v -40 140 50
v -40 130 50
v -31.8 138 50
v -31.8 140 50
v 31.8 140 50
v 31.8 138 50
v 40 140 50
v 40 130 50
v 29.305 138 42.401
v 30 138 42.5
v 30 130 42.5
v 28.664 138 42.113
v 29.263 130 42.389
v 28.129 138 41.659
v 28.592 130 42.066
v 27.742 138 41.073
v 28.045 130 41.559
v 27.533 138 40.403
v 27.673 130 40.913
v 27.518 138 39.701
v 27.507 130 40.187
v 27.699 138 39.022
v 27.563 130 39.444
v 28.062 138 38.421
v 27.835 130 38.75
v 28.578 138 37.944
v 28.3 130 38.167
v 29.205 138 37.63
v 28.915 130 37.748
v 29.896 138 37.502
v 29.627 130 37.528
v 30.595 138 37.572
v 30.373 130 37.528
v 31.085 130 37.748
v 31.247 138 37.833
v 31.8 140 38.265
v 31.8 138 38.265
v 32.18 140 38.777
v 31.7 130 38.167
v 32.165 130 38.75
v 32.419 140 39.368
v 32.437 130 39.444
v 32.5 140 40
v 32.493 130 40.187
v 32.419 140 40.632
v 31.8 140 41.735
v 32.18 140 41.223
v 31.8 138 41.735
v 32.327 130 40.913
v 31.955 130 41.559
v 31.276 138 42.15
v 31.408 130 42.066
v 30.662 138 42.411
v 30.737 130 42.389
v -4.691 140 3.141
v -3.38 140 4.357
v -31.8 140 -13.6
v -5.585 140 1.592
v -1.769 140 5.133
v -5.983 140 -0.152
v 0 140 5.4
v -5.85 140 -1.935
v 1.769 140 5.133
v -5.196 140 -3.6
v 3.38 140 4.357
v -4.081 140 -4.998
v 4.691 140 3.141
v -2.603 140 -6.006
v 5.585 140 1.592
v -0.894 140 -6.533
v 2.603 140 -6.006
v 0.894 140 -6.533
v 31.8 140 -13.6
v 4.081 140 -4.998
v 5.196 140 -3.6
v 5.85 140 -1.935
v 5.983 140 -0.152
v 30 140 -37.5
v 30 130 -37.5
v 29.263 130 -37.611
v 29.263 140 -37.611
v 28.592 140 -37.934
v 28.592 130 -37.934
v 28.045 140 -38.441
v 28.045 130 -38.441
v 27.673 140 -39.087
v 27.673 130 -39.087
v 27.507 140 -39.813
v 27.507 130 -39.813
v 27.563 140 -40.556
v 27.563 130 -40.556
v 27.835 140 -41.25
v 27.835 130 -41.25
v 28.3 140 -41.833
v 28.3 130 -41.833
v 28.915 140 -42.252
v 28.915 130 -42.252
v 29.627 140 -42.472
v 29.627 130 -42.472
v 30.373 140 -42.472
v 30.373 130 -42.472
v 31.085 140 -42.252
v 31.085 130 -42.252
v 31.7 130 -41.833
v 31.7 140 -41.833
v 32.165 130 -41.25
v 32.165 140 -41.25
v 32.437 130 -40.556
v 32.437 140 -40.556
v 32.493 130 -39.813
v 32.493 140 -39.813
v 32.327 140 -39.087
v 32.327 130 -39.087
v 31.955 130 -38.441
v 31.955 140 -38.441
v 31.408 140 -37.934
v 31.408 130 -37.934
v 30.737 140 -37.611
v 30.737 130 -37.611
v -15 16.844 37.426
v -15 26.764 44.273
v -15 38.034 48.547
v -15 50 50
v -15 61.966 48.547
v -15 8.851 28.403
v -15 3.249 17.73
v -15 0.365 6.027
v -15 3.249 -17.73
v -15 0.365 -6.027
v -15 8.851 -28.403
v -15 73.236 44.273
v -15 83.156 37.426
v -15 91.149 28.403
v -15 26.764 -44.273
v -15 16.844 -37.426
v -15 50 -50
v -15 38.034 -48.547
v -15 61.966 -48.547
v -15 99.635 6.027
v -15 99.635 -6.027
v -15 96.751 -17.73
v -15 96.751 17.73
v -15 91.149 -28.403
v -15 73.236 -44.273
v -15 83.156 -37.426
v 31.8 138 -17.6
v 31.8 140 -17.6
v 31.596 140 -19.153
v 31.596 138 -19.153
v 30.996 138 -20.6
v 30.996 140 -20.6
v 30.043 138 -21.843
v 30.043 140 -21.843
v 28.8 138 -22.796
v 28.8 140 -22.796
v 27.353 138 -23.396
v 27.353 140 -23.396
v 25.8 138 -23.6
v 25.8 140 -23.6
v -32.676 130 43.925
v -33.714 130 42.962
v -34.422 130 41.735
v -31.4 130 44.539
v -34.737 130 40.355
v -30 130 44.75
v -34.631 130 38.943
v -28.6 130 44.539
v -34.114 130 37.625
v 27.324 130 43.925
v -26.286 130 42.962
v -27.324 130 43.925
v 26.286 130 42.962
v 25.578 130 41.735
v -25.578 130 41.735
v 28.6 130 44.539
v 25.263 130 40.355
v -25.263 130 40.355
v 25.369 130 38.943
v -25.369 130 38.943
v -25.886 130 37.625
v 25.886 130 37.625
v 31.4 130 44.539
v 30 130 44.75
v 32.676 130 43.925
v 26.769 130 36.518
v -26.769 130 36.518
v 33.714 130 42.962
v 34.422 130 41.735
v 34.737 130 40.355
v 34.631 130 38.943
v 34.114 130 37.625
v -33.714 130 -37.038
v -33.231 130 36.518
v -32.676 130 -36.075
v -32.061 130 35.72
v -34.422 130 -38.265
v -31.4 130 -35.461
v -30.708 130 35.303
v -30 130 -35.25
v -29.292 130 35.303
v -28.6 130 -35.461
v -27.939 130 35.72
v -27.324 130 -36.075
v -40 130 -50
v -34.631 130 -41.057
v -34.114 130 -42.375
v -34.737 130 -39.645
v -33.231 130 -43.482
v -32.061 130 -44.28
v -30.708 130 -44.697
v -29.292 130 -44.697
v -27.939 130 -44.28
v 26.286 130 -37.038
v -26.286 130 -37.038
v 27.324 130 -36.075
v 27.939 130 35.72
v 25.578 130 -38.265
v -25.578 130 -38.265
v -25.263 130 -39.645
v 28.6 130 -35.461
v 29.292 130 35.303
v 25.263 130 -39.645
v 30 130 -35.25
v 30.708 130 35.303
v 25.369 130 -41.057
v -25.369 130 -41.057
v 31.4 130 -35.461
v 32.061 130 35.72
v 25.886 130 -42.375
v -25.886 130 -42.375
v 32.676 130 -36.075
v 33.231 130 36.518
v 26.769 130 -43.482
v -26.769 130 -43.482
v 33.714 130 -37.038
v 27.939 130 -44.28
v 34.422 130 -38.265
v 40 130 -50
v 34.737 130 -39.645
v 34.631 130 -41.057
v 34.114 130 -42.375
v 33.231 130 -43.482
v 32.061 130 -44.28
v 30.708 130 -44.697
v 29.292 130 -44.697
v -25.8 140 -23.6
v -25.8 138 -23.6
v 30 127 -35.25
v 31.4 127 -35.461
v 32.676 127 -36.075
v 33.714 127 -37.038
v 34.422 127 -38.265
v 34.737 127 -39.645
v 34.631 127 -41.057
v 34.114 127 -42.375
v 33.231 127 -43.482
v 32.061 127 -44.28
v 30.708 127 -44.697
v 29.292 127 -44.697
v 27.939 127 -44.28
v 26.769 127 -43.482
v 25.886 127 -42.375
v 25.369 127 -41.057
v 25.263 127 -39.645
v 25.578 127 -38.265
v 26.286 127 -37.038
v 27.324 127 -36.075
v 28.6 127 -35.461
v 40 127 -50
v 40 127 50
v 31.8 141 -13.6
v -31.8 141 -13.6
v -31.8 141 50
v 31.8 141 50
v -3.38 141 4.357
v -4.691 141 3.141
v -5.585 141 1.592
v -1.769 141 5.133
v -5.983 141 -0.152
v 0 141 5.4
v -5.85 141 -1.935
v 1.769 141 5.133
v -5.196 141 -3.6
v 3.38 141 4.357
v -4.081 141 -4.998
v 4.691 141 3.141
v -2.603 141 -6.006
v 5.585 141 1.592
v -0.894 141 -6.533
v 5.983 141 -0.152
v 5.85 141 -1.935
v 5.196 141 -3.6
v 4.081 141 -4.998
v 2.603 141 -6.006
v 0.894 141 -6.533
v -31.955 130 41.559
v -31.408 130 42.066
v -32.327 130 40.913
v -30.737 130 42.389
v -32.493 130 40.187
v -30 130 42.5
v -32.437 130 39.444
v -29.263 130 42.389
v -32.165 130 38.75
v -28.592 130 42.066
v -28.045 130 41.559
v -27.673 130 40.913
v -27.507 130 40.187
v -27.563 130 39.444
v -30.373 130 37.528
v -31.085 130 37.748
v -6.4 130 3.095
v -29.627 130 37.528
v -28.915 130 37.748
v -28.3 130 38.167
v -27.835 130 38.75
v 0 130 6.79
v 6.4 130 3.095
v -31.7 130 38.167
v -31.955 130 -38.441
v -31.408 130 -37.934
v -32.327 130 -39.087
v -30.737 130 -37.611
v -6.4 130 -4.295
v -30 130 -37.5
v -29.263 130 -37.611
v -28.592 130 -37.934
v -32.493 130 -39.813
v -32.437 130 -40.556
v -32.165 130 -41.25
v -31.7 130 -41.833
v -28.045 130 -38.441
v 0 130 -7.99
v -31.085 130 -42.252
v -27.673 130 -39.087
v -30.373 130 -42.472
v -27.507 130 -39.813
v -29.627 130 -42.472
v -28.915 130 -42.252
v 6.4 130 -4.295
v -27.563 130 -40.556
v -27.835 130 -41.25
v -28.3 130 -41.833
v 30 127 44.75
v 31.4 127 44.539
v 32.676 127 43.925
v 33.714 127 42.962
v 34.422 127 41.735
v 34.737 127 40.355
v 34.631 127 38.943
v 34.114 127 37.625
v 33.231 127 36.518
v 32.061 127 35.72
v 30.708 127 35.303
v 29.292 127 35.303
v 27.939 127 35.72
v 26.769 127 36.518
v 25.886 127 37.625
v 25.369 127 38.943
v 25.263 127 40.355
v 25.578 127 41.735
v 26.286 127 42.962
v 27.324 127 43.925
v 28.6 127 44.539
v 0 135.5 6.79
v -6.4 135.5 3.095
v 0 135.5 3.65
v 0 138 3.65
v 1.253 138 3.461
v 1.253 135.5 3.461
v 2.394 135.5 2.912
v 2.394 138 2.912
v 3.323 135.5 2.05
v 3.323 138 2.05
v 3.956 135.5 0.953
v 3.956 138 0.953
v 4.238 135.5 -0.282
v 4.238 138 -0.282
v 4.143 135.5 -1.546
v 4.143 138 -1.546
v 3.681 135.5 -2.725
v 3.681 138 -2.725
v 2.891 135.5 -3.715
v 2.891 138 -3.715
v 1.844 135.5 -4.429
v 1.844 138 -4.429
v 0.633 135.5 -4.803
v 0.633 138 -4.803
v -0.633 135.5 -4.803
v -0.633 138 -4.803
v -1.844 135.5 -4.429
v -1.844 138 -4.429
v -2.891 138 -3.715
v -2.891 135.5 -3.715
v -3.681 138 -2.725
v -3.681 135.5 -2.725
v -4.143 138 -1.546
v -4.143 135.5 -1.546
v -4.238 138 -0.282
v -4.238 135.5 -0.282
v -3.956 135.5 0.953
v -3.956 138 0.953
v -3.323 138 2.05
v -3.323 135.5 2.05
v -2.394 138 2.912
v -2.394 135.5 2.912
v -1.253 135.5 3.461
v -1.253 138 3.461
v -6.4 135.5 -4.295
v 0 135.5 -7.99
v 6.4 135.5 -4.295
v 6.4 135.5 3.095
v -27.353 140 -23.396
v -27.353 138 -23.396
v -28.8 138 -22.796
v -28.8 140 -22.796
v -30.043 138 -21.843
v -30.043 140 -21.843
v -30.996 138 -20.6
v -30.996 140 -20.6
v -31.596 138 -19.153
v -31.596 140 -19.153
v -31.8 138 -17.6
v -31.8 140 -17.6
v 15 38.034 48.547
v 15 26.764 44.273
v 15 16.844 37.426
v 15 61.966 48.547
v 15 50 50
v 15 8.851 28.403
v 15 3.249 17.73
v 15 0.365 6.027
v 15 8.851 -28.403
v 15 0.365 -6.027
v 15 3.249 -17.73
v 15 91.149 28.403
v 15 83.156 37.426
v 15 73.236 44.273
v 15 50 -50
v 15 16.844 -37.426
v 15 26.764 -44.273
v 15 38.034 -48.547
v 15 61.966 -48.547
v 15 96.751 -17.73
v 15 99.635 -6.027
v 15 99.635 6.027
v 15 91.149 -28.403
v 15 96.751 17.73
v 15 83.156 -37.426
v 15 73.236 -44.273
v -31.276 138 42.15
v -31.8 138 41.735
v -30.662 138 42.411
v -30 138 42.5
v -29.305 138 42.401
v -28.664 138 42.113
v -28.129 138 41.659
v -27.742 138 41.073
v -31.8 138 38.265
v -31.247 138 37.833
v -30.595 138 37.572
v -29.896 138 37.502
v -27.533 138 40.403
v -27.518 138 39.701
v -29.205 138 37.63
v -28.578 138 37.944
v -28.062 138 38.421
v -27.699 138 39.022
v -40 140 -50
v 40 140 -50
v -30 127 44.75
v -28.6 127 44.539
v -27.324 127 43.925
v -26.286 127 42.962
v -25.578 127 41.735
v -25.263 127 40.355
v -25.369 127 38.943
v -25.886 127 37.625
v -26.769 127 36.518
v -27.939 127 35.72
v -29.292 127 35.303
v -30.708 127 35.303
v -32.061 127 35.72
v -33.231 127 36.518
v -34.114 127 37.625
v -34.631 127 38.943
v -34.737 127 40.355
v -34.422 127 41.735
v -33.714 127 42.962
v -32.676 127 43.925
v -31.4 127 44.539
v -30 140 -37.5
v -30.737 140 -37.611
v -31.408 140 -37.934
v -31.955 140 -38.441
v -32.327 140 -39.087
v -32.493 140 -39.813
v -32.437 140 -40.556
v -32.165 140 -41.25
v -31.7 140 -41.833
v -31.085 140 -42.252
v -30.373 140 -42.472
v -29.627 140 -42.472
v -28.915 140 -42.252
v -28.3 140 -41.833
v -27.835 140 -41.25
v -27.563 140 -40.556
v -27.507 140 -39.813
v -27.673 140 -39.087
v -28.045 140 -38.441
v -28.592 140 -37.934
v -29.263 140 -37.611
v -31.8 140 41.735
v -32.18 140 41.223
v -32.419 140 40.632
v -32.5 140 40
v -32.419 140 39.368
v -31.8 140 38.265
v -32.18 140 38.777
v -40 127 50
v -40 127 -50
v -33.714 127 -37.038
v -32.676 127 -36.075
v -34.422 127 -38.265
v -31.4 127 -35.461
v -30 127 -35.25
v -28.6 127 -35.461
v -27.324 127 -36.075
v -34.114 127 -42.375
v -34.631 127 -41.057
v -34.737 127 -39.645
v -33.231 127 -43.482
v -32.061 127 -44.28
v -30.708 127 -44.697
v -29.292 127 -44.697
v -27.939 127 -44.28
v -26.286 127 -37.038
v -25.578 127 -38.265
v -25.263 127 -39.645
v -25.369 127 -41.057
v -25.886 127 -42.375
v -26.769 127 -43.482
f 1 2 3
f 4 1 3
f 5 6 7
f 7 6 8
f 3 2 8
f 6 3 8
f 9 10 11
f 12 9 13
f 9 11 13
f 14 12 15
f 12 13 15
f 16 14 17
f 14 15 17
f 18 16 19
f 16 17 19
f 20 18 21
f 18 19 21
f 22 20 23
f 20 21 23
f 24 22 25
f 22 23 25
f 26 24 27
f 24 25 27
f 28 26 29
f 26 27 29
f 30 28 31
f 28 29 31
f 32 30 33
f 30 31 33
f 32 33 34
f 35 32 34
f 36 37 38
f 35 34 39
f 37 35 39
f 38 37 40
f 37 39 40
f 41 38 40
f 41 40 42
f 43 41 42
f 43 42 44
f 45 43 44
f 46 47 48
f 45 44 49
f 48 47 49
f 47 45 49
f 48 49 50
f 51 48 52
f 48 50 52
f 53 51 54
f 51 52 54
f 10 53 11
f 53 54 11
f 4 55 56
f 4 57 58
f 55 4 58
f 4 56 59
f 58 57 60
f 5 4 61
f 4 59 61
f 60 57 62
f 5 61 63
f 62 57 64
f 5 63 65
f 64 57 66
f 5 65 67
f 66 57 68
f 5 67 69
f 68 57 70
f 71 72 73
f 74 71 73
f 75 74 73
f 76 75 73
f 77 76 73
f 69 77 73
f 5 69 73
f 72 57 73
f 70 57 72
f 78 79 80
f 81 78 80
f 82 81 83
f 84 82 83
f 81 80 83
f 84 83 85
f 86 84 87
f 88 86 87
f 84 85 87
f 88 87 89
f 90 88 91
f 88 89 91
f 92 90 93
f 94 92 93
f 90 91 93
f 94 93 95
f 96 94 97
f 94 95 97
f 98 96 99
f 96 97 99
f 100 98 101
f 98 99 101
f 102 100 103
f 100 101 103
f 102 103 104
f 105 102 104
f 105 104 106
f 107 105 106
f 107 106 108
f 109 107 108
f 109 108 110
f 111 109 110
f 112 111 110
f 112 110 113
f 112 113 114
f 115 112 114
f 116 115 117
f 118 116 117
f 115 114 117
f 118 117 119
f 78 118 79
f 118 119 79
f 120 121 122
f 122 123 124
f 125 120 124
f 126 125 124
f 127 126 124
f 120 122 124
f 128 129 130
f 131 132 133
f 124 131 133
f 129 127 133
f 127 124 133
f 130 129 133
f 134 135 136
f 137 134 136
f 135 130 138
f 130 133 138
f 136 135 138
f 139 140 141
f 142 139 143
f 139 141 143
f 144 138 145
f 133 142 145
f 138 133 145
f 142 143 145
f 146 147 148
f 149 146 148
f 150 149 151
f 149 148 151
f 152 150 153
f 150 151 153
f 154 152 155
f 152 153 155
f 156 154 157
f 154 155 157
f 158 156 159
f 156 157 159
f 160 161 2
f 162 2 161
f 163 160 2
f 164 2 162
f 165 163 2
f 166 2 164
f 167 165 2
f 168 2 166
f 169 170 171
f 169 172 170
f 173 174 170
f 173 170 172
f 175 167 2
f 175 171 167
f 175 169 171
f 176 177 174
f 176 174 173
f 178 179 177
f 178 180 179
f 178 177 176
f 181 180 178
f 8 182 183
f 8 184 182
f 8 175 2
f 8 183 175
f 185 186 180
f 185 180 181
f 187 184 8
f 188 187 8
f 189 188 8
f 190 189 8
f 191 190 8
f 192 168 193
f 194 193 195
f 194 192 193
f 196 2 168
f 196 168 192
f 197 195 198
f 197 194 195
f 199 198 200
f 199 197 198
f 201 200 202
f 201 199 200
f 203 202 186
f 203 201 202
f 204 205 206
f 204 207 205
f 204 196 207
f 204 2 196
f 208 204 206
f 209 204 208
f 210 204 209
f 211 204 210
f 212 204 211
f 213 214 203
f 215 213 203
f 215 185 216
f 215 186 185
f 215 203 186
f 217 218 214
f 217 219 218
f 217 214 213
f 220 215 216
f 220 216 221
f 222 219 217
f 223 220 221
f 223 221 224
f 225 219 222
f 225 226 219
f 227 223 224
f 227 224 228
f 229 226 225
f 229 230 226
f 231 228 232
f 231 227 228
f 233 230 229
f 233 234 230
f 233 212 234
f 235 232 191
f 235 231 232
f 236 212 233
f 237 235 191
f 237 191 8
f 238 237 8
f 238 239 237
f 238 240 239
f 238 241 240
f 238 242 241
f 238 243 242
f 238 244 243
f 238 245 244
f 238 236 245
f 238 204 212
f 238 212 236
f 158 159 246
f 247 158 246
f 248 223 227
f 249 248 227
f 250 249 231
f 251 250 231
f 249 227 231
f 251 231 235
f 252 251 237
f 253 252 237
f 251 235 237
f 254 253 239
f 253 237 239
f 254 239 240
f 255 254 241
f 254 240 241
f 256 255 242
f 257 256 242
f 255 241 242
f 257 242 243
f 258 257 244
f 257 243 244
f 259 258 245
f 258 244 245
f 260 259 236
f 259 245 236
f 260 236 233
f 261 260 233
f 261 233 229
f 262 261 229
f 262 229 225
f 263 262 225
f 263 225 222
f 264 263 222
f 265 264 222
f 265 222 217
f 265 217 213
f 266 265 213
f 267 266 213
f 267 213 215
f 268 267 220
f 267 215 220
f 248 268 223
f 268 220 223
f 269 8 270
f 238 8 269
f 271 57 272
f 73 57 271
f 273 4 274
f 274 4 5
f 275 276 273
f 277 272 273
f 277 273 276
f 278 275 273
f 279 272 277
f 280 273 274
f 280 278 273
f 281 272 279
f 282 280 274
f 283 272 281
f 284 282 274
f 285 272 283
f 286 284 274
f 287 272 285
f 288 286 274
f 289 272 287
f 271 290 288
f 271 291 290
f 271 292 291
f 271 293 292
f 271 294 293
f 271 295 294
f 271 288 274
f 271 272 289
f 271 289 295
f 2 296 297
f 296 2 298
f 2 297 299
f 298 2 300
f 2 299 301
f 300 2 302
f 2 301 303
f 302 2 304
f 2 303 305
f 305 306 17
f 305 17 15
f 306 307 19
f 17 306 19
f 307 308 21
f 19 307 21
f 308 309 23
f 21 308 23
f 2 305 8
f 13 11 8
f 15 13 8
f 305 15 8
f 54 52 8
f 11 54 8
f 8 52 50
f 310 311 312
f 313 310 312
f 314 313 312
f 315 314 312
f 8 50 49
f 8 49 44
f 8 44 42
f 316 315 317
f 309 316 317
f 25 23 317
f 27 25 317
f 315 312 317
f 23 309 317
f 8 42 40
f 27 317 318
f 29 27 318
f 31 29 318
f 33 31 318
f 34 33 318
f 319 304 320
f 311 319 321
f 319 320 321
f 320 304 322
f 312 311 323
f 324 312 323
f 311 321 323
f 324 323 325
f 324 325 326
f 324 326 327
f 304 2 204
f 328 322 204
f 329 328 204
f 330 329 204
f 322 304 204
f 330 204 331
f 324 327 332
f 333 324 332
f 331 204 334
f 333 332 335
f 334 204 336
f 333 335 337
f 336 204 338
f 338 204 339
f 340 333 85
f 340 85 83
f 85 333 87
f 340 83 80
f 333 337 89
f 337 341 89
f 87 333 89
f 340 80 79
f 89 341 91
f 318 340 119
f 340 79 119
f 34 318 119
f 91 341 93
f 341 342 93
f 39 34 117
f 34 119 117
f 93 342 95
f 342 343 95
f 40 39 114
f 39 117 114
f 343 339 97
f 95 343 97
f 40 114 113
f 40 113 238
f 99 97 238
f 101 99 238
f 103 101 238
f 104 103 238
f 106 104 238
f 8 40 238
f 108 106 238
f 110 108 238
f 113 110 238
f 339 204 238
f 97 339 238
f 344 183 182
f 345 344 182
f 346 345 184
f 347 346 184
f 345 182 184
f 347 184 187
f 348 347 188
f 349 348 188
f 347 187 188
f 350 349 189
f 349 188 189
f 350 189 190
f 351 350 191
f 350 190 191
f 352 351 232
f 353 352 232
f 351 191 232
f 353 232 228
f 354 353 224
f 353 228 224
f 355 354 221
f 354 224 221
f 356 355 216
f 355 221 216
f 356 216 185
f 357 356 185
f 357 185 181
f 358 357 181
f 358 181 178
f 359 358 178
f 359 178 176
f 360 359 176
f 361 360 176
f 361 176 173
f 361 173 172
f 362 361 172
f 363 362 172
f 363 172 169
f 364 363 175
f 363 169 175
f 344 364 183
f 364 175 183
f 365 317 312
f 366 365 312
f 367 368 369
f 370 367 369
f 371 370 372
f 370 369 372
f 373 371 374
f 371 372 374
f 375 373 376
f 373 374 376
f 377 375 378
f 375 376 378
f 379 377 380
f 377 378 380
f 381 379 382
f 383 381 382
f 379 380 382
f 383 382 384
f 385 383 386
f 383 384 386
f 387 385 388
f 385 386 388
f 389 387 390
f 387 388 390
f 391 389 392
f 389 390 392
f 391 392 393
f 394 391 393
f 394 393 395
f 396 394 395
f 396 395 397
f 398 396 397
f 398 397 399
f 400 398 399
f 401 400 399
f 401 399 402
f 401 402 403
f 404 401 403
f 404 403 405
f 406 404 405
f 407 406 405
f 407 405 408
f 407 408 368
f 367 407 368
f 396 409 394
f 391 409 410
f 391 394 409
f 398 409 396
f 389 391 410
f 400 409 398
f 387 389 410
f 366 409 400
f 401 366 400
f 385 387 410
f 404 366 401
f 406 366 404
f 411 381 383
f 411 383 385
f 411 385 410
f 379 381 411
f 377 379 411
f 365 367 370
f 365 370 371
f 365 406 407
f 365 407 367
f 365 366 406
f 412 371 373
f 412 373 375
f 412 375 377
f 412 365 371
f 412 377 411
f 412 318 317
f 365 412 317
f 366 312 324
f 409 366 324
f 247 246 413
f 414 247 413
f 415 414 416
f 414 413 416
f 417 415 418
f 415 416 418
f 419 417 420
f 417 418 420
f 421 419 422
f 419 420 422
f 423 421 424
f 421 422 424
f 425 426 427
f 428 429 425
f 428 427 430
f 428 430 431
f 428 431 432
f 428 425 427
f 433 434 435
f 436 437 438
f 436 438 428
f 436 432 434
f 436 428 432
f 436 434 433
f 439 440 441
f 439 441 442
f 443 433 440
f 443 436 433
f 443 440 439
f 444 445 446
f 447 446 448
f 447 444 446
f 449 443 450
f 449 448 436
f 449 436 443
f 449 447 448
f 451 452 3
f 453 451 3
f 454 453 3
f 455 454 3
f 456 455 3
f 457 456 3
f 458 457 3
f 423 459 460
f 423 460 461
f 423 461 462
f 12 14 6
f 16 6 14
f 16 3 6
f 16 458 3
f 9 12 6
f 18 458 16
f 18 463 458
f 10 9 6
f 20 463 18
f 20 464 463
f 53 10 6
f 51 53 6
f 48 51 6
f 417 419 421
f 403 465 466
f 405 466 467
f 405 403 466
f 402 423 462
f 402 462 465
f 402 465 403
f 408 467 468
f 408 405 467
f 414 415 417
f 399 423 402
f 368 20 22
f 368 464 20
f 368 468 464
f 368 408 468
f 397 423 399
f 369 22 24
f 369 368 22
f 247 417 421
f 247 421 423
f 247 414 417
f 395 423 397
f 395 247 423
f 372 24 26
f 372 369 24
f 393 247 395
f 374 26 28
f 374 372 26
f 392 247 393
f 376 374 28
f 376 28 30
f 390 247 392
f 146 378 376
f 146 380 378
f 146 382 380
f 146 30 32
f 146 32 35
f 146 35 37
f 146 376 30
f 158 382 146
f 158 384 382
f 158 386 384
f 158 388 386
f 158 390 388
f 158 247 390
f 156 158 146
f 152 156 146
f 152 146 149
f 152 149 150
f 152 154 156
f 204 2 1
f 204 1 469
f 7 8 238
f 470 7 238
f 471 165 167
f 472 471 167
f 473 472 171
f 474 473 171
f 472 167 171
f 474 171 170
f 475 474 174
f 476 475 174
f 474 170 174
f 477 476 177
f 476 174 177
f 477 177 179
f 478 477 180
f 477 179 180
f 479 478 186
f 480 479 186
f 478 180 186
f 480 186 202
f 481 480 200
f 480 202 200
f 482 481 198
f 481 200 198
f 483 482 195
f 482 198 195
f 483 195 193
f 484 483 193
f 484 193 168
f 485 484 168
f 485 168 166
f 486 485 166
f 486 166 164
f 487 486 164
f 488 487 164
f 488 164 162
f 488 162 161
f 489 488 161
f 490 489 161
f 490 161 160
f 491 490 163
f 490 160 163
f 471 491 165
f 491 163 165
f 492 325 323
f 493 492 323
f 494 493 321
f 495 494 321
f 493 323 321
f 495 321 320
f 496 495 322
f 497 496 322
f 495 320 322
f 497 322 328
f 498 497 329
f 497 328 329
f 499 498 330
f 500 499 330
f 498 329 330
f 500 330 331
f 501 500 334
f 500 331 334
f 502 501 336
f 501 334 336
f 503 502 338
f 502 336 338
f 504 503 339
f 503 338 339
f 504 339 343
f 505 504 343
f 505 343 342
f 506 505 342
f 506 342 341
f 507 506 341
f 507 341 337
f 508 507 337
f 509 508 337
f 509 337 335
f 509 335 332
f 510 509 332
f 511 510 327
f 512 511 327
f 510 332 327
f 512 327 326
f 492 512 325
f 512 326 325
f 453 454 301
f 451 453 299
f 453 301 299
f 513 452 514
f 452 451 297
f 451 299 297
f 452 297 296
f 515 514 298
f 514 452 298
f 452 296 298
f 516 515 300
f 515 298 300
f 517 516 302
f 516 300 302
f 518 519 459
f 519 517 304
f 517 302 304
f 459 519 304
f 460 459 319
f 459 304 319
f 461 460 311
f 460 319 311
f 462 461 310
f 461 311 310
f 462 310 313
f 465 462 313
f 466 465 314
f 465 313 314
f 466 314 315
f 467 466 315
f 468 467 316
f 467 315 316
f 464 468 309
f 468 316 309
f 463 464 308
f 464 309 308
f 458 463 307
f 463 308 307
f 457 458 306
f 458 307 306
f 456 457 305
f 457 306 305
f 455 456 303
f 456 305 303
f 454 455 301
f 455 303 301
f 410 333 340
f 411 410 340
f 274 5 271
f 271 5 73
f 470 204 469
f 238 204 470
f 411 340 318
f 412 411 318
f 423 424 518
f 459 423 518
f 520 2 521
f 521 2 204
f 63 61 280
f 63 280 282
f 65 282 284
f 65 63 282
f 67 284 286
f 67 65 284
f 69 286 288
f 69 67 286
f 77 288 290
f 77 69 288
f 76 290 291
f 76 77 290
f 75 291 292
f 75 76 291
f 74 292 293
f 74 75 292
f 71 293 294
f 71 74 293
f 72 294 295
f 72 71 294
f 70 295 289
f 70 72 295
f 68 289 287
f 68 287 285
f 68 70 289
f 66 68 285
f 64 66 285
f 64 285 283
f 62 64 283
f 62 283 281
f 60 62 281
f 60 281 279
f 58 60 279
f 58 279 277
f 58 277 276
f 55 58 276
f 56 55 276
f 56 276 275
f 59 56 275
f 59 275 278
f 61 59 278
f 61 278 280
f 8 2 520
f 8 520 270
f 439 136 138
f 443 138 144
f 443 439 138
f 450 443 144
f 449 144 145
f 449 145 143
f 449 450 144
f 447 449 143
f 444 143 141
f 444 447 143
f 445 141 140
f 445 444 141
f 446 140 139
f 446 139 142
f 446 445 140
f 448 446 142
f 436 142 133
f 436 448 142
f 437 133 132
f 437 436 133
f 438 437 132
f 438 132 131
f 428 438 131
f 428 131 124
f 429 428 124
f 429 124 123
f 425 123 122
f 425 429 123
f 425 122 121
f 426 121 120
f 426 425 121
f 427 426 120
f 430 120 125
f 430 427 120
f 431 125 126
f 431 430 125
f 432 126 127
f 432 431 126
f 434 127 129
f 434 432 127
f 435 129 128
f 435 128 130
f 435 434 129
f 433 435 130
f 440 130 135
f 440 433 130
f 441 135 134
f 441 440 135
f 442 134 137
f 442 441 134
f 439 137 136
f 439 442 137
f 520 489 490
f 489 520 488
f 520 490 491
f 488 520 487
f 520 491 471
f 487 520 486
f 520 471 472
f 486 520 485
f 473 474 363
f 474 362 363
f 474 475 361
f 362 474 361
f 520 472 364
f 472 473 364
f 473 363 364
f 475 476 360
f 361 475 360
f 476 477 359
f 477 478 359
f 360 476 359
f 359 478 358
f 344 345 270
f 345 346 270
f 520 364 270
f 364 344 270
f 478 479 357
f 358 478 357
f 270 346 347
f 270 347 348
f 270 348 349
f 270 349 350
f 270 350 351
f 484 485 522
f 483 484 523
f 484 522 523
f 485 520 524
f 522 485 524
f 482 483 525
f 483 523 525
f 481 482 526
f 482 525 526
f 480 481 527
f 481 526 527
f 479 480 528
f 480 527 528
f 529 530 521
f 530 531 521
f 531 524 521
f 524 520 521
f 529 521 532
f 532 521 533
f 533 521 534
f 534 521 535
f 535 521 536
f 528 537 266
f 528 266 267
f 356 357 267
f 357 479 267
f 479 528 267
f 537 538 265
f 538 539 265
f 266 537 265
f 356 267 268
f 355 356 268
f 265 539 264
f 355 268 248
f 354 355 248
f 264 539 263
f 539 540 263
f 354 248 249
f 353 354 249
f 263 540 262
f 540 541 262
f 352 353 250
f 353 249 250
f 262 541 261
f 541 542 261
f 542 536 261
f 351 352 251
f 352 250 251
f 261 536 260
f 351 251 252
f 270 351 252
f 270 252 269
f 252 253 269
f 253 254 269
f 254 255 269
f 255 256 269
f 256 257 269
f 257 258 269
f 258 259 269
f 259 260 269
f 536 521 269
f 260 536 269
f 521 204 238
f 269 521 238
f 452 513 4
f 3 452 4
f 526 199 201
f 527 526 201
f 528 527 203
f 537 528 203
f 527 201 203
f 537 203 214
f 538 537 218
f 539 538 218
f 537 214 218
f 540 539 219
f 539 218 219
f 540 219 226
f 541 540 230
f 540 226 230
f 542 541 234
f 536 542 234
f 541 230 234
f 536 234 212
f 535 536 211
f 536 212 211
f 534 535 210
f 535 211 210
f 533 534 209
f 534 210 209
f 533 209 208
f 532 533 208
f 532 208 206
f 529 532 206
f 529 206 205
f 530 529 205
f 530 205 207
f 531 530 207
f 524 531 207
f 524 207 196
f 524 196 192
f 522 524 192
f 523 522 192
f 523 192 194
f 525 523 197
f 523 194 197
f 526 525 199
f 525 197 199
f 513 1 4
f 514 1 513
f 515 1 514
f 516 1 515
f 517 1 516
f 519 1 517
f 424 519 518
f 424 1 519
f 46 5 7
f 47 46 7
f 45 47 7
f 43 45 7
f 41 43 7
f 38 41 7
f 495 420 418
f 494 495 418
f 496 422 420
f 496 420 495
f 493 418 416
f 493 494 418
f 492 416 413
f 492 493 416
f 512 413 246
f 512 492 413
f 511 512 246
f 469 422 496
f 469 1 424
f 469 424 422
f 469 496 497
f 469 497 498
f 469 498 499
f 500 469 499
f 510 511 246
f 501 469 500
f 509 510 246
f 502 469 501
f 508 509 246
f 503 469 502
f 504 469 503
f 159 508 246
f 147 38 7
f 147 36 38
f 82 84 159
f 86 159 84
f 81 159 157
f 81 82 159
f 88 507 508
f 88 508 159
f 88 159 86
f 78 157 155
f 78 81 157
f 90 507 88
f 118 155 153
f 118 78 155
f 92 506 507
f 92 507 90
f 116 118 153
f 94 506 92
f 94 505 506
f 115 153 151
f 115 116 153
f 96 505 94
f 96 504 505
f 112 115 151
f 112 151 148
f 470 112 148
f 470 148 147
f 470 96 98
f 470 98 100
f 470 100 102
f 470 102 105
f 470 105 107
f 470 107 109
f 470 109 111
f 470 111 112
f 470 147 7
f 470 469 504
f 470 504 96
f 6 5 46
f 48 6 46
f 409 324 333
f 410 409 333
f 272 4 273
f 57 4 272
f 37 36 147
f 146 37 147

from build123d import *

# Parameters (mm, degrees)
SKETCH1_R                  = 50
BOSS_EXTRUDE1_DEPTH        = 15
BOSS_EXTRUDE2_START        = 130
SKETCH2_W                  = 80
SKETCH2_H                  = 100
SKETCH2_R                  = 4.75
BOSS_EXTRUDE2_DEPTH        = 3
BOSS_EXTRUDE3_START        = 8
SKETCH3_W                  = 63.6
SKETCH3_H                  = 63.6
SKETCH3_R                  = 6
BOSS_EXTRUDE3_DEPTH        = 3
SKETCH4_W                  = 80
SKETCH4_H                  = 100
BOSS_EXTRUDE4_DEPTH        = 10
SKETCH6_W                  = 2.5
SKETCH6_H                  = 140
M6_TAPPED_HOLE1_AT_2_COUNT = 2
M6_TAPPED_HOLE1_AT_2_PITCH = 60
M6_TAPPED_HOLE1_AT_3_COUNT = 2
M6_TAPPED_HOLE1_AT_3_PITCH = 80
M6_TAPPED_HOLE1_AT_4_COUNT = 2
M6_TAPPED_HOLE1_AT_4_PITCH = 100
SKETCH7_R                  = 4.25
CUT_EXTRUDE1_DEPTH         = 154.948043183
CUT_EXTRUDE2_DEPTH         = 2
CUT_EXTRUDE3_DEPTH         = 5.5


with BuildPart() as part:
    # Sketch1 → Boss-Extrude1 (new, symmetric)
    with BuildSketch(Plane(origin=(0, 0, 0), x_dir=(0, 0, -1), z_dir=(1, 0, 0))):
        with Locations((0, 50)):
            Circle(SKETCH1_R)
    extrude(amount=BOSS_EXTRUDE1_DEPTH, both=True)


with BuildPart() as body_2:
    # Sketch2 → Boss-Extrude2 (new body)
    with BuildSketch(Plane(origin=(0, 0, 0), x_dir=(1, 0, 0), z_dir=(0, 1, 0)).offset(BOSS_EXTRUDE2_START)):
        Rectangle(SKETCH2_W, SKETCH2_H)
        with Locations(Location((-30, 40, 0), (0, 0, 270))):
            Circle(SKETCH2_R, mode=Mode.SUBTRACT)
        with Locations(Location((30, 40, 0), (0, 0, 270))):
            Circle(SKETCH2_R, mode=Mode.SUBTRACT)
        with Locations(Location((-30, -40, 0), (0, 0, 270))):
            Circle(SKETCH2_R, mode=Mode.SUBTRACT)
        with Locations(Location((30, -40, 0), (0, 0, 270))):
            Circle(SKETCH2_R, mode=Mode.SUBTRACT)
    extrude(amount=-BOSS_EXTRUDE2_DEPTH)


with BuildPart() as body_3:
    # Sketch3 → Boss-Extrude3 (new body)
    with BuildSketch(Plane(origin=(0, 130, 0), x_dir=(1, 0, 0), z_dir=(0, 1, 0)).offset(BOSS_EXTRUDE3_START)):
        with Locations((0, -18.2)):
            Rectangle(SKETCH3_W, SKETCH3_H)
        with Locations(Location((0, 0.6, 0), (0, 0, 270))):
            Circle(SKETCH3_R, mode=Mode.SUBTRACT)
    extrude(amount=BOSS_EXTRUDE3_DEPTH)


with BuildPart() as body_4:
    # Sketch4 → Boss-Extrude4 (new body)
    with BuildSketch(Plane(origin=(0, 130, 0), x_dir=(1, 0, 0), z_dir=(0, 1, 0))):
        Rectangle(SKETCH4_W, SKETCH4_H)
    extrude(amount=BOSS_EXTRUDE4_DEPTH)

    # Sketch6 → M6 Tapped Hole1 (revolve, cut)
    with BuildSketch(Plane(origin=(-30, 140, -40), x_dir=(0, 0, 1), z_dir=(1, 0, 0))):
        with Locations((1.25, 70)):
            Rectangle(SKETCH6_W, SKETCH6_H)
    m6_tapped_hole1 = revolve(axis=Axis((-30, 146.35, -40), (0, -1, 0)), mode=Mode.SUBTRACT)

    # M6 Tapped Hole1 at 2: M6 Tapped Hole1 ×2
    with Locations(*[(i * M6_TAPPED_HOLE1_AT_2_PITCH, 0, 0) for i in range(1, M6_TAPPED_HOLE1_AT_2_COUNT)]):
        add(m6_tapped_hole1, mode=Mode.SUBTRACT)

    # M6 Tapped Hole1 at 3: M6 Tapped Hole1 ×2
    with Locations(*[(0, 0, i * M6_TAPPED_HOLE1_AT_3_PITCH) for i in range(1, M6_TAPPED_HOLE1_AT_3_COUNT)]):
        add(m6_tapped_hole1, mode=Mode.SUBTRACT)

    # M6 Tapped Hole1 at 4: M6 Tapped Hole1 ×2
    with Locations(*[Vector(0.6, 0, 0.8) * (i * M6_TAPPED_HOLE1_AT_4_PITCH) for i in range(1, M6_TAPPED_HOLE1_AT_4_COUNT)]):
        add(m6_tapped_hole1, mode=Mode.SUBTRACT)

    # Sketch7 → Cut-Extrude1 (cut, through all)
    with BuildSketch(Plane(origin=(0, 140, 0), x_dir=(1, 0, 0), z_dir=(0, 1, 0))):
        with Locations(Location((0, 0.6, 0), (0, 0, 270))):
            Circle(SKETCH7_R)
    extrude(amount=-CUT_EXTRUDE1_DEPTH, mode=Mode.SUBTRACT)


with BuildPart() as cut_extrude2_tool:
    # Sketch8 → Cut-Extrude2 (new body)
    with BuildSketch(Plane(origin=(0, 140, 0), x_dir=(1, 0, 0), z_dir=(0, 1, 0))):
        with BuildLine():
            Line((-31.8, -50), (31.8, -50))
            Line((31.8, -50), (31.8, 17.6))
            ThreePointArc((31.8, 17.6), (30.042640687, 21.842640687), (25.8, 23.6))
            Line((25.8, 23.6), (-25.8, 23.6))
            ThreePointArc((-25.8, 23.6), (-30.042640687, 21.842640687), (-31.8, 17.6))
            Line((-31.8, 17.6), (-31.8, -50))
        make_face()
    extrude(amount=-CUT_EXTRUDE2_DEPTH)


with BuildPart() as body_3_1:
    add(body_3.part)

    # Cut-Extrude2: cut by cut_extrude2_tool
    add(cut_extrude2_tool.part, mode=Mode.SUBTRACT)


with BuildPart() as body_4_1:
    add(body_4.part)

    # Cut-Extrude2: cut by cut_extrude2_tool
    add(cut_extrude2_tool.part, mode=Mode.SUBTRACT)

    # Sketch9 → Cut-Extrude3 (cut)
    with BuildSketch(Plane.XZ.offset(-130)):
        Polygon((0, 6.790083446), (-6.4, 3.095041723), (-6.4, -4.295041723), (0, -7.990083446), (6.4, -4.295041723), (6.4, 3.095041723), align=None)
    extrude(amount=-CUT_EXTRUDE3_DEPTH, mode=Mode.SUBTRACT)


solid = Compound([part.part, body_2.part, body_3_1.part, body_4_1.part])
